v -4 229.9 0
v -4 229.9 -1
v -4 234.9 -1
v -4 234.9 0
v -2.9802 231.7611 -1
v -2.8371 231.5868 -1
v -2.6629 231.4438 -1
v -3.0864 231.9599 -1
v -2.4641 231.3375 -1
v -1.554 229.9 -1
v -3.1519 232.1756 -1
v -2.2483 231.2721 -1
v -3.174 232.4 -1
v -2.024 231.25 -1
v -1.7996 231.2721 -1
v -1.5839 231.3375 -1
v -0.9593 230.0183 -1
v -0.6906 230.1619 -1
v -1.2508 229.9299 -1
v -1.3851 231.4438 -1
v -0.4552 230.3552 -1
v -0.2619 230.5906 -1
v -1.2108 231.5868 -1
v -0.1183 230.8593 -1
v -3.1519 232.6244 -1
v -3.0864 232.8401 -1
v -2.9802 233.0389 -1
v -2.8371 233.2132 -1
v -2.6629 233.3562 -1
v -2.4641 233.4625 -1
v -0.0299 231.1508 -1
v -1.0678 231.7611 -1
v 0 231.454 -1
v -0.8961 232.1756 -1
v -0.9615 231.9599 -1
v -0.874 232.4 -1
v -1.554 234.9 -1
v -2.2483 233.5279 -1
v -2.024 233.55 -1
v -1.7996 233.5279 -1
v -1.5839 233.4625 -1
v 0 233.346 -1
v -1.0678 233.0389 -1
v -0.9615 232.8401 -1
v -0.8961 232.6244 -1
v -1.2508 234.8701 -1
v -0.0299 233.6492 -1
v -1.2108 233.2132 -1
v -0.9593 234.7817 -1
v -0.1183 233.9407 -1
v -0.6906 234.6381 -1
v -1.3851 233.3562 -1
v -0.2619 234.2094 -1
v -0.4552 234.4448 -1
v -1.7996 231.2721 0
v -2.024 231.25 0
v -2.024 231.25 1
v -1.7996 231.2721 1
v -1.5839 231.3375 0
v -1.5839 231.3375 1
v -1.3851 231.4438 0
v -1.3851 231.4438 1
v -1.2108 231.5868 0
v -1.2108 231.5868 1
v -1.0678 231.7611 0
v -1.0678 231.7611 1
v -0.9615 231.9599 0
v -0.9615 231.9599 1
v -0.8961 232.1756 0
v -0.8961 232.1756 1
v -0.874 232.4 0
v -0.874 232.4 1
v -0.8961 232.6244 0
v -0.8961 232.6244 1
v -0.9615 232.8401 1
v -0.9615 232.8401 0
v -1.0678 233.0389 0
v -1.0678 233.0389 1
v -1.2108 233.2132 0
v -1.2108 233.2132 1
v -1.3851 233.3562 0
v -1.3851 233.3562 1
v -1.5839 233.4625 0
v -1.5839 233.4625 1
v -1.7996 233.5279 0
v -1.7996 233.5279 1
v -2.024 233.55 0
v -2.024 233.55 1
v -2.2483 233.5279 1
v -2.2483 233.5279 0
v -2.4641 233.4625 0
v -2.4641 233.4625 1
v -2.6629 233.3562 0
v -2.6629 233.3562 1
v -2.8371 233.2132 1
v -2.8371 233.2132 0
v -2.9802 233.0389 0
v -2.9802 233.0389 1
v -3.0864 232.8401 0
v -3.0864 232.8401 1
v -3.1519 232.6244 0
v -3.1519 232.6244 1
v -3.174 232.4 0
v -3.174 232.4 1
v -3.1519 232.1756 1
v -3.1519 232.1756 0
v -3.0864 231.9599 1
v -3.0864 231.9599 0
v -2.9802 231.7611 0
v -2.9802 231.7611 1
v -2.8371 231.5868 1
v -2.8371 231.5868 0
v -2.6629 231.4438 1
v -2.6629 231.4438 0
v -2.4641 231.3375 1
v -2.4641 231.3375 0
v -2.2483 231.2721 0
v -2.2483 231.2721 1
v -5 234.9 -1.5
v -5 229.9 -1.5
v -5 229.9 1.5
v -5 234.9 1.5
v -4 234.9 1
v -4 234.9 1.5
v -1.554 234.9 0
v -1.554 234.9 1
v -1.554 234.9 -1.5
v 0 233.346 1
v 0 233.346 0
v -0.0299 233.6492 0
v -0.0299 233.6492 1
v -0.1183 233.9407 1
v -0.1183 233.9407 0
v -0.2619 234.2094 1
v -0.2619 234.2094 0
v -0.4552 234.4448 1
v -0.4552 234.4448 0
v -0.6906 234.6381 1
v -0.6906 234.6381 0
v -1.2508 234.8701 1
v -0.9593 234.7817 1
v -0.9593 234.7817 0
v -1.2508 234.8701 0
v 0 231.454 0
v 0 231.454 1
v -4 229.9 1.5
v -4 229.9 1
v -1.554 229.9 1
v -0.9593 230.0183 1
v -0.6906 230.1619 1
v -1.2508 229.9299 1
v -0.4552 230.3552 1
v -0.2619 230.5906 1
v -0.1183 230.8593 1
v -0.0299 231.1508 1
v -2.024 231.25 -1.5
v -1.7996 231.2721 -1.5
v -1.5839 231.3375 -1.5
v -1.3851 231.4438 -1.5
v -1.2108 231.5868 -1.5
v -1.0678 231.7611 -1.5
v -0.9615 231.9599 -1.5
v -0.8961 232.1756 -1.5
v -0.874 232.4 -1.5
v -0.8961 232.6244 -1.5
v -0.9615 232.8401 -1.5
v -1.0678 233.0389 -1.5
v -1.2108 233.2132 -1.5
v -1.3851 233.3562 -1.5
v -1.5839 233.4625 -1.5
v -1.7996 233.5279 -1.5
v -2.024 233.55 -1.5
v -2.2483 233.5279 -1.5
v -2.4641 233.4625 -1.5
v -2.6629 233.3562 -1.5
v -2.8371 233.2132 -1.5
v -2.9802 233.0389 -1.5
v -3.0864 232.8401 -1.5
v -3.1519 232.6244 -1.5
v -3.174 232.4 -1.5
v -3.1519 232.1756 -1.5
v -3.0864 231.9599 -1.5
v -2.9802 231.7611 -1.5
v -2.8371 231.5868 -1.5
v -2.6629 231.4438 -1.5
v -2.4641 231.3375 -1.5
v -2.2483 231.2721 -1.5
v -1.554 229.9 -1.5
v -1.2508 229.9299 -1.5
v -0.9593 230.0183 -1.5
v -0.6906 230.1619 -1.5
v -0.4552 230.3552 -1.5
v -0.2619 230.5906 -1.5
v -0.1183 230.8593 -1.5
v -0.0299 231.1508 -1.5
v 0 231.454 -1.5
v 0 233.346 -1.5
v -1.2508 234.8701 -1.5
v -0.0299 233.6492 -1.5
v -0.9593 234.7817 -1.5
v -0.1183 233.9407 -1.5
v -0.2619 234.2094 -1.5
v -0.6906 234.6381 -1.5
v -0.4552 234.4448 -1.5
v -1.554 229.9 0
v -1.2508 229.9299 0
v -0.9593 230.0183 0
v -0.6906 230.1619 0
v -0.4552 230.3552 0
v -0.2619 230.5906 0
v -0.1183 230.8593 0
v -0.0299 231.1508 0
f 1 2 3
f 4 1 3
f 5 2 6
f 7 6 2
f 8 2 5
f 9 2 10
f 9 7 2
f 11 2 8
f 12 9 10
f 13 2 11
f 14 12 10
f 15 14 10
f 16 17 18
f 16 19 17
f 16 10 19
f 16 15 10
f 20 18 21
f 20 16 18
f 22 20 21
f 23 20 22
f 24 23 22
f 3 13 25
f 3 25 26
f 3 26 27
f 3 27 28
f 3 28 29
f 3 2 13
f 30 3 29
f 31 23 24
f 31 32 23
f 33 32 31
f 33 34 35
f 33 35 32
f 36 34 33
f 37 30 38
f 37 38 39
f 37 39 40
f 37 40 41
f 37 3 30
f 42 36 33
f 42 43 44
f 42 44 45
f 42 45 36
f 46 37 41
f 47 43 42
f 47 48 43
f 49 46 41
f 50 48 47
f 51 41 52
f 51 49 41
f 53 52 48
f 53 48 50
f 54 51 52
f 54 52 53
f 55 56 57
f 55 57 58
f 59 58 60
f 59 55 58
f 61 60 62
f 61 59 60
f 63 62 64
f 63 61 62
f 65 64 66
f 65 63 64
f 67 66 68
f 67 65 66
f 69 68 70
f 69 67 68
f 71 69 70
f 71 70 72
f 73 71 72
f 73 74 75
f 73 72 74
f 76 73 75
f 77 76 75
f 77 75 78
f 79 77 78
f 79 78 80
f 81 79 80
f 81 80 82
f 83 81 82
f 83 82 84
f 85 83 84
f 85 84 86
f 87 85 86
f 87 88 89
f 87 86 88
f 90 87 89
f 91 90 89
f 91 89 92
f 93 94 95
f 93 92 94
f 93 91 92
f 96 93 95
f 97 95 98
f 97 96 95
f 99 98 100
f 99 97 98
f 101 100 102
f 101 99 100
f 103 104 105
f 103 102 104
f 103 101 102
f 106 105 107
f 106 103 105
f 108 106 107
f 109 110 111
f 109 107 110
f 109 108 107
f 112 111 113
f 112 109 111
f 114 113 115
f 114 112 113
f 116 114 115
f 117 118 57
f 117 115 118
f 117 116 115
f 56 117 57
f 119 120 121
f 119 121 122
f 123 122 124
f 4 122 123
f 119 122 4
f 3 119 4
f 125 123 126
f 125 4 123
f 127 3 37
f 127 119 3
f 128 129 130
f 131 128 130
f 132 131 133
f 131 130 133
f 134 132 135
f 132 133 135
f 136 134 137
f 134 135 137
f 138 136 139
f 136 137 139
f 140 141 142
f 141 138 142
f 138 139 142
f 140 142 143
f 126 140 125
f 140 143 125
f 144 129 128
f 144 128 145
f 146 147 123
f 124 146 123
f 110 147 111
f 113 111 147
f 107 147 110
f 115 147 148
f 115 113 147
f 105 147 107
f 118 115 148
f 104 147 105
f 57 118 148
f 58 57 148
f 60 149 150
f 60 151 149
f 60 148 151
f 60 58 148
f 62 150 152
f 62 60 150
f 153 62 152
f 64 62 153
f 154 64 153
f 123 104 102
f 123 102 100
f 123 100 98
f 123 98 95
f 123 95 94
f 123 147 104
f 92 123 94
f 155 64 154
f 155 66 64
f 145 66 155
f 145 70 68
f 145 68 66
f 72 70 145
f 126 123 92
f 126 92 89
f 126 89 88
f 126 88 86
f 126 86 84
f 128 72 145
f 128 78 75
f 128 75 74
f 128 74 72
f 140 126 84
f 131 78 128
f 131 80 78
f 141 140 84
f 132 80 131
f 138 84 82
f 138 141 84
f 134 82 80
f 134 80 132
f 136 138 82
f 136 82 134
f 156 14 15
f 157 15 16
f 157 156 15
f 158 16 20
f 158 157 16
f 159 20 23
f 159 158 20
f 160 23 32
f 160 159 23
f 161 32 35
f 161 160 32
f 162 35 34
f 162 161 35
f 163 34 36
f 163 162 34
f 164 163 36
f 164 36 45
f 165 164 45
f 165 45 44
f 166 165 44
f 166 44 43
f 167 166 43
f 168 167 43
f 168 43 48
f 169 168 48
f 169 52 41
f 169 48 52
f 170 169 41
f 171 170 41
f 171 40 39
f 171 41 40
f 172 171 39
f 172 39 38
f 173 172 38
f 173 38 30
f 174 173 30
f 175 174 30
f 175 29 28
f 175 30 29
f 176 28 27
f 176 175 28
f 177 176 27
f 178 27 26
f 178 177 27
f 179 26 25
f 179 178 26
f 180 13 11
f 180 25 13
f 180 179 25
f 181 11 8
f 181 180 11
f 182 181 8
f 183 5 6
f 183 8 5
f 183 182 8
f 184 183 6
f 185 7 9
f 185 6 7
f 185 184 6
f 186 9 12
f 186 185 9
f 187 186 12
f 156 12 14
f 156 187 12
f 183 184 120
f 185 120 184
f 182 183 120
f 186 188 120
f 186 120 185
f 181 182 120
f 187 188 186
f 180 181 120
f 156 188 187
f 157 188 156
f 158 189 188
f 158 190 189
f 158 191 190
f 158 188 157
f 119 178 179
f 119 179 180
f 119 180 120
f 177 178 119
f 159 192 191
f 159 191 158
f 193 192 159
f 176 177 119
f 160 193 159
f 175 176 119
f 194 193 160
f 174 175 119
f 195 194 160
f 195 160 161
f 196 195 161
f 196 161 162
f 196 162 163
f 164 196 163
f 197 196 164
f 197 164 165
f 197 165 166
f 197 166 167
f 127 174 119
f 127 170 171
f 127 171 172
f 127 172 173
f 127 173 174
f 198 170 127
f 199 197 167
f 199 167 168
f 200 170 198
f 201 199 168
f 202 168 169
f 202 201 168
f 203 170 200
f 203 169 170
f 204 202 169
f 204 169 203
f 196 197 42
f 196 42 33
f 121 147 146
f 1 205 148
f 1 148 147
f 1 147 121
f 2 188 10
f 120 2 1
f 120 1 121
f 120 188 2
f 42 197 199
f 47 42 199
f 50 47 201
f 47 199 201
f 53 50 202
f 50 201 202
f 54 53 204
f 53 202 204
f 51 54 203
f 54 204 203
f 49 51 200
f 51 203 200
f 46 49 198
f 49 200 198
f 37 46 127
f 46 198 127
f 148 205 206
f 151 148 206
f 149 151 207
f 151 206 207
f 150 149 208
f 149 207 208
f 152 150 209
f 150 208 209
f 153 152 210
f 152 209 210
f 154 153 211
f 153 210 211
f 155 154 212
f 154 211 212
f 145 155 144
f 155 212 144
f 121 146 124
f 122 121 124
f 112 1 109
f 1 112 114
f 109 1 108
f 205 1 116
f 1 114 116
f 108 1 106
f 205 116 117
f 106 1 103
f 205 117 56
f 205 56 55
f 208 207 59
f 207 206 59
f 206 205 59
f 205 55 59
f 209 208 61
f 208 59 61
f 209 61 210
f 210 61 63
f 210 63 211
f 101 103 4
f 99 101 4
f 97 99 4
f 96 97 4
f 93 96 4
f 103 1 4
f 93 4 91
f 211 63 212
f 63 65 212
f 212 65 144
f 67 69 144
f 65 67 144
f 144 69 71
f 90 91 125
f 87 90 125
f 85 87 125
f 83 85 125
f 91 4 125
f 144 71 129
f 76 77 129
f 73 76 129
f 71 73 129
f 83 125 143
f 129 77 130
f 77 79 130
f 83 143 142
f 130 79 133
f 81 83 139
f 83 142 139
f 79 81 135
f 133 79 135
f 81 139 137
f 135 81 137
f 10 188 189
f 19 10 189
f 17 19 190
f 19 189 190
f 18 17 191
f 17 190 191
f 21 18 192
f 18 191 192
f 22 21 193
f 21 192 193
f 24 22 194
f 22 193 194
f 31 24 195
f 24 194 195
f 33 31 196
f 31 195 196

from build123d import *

# Parameters (mm, degrees)
BOX106_W                                  = 10
BOX106_H                                  = 10
BOX106_DEPTH                              = 1
BOX105_W                                  = 10
BOX105_H                                  = 10
BOX105_DEPTH                              = 10
SKETCH012_AS_DRAWN_R                      = 1.15
EXTRUDE002_DEPTH                          = 3
EXTRUDE002_ONTO_SKETCH012_PLACEMENT_ANGLE = -90


with BuildPart() as cubo106:
    # Box106 → Box106 (new body)
    with BuildSketch(Plane(origin=(-4, 226, -1), x_dir=(1, 0, 0), z_dir=(0, 0, 1))):
        with Locations((5, 5)):
            Rectangle(BOX106_W, BOX106_H)
    extrude(amount=BOX106_DEPTH)


with BuildPart() as cubo105:
    # Box105 → Box105 (new body)
    with BuildSketch(Plane(origin=(-4, 225, 1), x_dir=(1, 0, 0), z_dir=(0, 0, 1))):
        with Locations((5, 5)):
            Rectangle(BOX105_W, BOX105_H)
    extrude(amount=BOX105_DEPTH)


with BuildPart() as pivote_superior001:
    # Sketch012 as drawn → Extrude002 (new)
    with BuildSketch(Plane.XY):
        with BuildLine():
            Line((-0.94599, 5), (0.94599, 5))
            ThreePointArc((2.5, 3.44599), (2.044841, 4.544841), (0.94599, 5))
            Line((2.5, 3.44599), (2.5, 0))
            Line((2.5, 0), (-2.5, 0))
            Line((-2.5, 0), (-2.5, 3.44599))
            ThreePointArc((-0.94599, 5), (-2.044841, 4.544841), (-2.5, 3.44599))
        make_face()
        with Locations((0, 2.97603)):
            Circle(SKETCH012_AS_DRAWN_R, mode=Mode.SUBTRACT)
    extrude(amount=EXTRUDE002_DEPTH)


with BuildPart() as pivote_superior001_1:
    # Extrude002 onto Sketch012 placement: moved
    add(pivote_superior001.part.moved(Location((-5, 232.4, 0))).rotate(Axis((-5, 232.4, 0), (0, 0, 1)), EXTRUDE002_ONTO_SKETCH012_PLACEMENT_ANGLE))


with BuildPart() as pivote_superior001_2:
    # Extrude002 placement: moved
    add(pivote_superior001_1.part.moved(Location((0, 0, -1.5))))

    # Cut054: cut Cubo105
    add(cubo105.part, mode=Mode.SUBTRACT)

    # Cut055: cut Cubo106
    add(cubo106.part, mode=Mode.SUBTRACT)


solid = pivote_superior001_2.part
